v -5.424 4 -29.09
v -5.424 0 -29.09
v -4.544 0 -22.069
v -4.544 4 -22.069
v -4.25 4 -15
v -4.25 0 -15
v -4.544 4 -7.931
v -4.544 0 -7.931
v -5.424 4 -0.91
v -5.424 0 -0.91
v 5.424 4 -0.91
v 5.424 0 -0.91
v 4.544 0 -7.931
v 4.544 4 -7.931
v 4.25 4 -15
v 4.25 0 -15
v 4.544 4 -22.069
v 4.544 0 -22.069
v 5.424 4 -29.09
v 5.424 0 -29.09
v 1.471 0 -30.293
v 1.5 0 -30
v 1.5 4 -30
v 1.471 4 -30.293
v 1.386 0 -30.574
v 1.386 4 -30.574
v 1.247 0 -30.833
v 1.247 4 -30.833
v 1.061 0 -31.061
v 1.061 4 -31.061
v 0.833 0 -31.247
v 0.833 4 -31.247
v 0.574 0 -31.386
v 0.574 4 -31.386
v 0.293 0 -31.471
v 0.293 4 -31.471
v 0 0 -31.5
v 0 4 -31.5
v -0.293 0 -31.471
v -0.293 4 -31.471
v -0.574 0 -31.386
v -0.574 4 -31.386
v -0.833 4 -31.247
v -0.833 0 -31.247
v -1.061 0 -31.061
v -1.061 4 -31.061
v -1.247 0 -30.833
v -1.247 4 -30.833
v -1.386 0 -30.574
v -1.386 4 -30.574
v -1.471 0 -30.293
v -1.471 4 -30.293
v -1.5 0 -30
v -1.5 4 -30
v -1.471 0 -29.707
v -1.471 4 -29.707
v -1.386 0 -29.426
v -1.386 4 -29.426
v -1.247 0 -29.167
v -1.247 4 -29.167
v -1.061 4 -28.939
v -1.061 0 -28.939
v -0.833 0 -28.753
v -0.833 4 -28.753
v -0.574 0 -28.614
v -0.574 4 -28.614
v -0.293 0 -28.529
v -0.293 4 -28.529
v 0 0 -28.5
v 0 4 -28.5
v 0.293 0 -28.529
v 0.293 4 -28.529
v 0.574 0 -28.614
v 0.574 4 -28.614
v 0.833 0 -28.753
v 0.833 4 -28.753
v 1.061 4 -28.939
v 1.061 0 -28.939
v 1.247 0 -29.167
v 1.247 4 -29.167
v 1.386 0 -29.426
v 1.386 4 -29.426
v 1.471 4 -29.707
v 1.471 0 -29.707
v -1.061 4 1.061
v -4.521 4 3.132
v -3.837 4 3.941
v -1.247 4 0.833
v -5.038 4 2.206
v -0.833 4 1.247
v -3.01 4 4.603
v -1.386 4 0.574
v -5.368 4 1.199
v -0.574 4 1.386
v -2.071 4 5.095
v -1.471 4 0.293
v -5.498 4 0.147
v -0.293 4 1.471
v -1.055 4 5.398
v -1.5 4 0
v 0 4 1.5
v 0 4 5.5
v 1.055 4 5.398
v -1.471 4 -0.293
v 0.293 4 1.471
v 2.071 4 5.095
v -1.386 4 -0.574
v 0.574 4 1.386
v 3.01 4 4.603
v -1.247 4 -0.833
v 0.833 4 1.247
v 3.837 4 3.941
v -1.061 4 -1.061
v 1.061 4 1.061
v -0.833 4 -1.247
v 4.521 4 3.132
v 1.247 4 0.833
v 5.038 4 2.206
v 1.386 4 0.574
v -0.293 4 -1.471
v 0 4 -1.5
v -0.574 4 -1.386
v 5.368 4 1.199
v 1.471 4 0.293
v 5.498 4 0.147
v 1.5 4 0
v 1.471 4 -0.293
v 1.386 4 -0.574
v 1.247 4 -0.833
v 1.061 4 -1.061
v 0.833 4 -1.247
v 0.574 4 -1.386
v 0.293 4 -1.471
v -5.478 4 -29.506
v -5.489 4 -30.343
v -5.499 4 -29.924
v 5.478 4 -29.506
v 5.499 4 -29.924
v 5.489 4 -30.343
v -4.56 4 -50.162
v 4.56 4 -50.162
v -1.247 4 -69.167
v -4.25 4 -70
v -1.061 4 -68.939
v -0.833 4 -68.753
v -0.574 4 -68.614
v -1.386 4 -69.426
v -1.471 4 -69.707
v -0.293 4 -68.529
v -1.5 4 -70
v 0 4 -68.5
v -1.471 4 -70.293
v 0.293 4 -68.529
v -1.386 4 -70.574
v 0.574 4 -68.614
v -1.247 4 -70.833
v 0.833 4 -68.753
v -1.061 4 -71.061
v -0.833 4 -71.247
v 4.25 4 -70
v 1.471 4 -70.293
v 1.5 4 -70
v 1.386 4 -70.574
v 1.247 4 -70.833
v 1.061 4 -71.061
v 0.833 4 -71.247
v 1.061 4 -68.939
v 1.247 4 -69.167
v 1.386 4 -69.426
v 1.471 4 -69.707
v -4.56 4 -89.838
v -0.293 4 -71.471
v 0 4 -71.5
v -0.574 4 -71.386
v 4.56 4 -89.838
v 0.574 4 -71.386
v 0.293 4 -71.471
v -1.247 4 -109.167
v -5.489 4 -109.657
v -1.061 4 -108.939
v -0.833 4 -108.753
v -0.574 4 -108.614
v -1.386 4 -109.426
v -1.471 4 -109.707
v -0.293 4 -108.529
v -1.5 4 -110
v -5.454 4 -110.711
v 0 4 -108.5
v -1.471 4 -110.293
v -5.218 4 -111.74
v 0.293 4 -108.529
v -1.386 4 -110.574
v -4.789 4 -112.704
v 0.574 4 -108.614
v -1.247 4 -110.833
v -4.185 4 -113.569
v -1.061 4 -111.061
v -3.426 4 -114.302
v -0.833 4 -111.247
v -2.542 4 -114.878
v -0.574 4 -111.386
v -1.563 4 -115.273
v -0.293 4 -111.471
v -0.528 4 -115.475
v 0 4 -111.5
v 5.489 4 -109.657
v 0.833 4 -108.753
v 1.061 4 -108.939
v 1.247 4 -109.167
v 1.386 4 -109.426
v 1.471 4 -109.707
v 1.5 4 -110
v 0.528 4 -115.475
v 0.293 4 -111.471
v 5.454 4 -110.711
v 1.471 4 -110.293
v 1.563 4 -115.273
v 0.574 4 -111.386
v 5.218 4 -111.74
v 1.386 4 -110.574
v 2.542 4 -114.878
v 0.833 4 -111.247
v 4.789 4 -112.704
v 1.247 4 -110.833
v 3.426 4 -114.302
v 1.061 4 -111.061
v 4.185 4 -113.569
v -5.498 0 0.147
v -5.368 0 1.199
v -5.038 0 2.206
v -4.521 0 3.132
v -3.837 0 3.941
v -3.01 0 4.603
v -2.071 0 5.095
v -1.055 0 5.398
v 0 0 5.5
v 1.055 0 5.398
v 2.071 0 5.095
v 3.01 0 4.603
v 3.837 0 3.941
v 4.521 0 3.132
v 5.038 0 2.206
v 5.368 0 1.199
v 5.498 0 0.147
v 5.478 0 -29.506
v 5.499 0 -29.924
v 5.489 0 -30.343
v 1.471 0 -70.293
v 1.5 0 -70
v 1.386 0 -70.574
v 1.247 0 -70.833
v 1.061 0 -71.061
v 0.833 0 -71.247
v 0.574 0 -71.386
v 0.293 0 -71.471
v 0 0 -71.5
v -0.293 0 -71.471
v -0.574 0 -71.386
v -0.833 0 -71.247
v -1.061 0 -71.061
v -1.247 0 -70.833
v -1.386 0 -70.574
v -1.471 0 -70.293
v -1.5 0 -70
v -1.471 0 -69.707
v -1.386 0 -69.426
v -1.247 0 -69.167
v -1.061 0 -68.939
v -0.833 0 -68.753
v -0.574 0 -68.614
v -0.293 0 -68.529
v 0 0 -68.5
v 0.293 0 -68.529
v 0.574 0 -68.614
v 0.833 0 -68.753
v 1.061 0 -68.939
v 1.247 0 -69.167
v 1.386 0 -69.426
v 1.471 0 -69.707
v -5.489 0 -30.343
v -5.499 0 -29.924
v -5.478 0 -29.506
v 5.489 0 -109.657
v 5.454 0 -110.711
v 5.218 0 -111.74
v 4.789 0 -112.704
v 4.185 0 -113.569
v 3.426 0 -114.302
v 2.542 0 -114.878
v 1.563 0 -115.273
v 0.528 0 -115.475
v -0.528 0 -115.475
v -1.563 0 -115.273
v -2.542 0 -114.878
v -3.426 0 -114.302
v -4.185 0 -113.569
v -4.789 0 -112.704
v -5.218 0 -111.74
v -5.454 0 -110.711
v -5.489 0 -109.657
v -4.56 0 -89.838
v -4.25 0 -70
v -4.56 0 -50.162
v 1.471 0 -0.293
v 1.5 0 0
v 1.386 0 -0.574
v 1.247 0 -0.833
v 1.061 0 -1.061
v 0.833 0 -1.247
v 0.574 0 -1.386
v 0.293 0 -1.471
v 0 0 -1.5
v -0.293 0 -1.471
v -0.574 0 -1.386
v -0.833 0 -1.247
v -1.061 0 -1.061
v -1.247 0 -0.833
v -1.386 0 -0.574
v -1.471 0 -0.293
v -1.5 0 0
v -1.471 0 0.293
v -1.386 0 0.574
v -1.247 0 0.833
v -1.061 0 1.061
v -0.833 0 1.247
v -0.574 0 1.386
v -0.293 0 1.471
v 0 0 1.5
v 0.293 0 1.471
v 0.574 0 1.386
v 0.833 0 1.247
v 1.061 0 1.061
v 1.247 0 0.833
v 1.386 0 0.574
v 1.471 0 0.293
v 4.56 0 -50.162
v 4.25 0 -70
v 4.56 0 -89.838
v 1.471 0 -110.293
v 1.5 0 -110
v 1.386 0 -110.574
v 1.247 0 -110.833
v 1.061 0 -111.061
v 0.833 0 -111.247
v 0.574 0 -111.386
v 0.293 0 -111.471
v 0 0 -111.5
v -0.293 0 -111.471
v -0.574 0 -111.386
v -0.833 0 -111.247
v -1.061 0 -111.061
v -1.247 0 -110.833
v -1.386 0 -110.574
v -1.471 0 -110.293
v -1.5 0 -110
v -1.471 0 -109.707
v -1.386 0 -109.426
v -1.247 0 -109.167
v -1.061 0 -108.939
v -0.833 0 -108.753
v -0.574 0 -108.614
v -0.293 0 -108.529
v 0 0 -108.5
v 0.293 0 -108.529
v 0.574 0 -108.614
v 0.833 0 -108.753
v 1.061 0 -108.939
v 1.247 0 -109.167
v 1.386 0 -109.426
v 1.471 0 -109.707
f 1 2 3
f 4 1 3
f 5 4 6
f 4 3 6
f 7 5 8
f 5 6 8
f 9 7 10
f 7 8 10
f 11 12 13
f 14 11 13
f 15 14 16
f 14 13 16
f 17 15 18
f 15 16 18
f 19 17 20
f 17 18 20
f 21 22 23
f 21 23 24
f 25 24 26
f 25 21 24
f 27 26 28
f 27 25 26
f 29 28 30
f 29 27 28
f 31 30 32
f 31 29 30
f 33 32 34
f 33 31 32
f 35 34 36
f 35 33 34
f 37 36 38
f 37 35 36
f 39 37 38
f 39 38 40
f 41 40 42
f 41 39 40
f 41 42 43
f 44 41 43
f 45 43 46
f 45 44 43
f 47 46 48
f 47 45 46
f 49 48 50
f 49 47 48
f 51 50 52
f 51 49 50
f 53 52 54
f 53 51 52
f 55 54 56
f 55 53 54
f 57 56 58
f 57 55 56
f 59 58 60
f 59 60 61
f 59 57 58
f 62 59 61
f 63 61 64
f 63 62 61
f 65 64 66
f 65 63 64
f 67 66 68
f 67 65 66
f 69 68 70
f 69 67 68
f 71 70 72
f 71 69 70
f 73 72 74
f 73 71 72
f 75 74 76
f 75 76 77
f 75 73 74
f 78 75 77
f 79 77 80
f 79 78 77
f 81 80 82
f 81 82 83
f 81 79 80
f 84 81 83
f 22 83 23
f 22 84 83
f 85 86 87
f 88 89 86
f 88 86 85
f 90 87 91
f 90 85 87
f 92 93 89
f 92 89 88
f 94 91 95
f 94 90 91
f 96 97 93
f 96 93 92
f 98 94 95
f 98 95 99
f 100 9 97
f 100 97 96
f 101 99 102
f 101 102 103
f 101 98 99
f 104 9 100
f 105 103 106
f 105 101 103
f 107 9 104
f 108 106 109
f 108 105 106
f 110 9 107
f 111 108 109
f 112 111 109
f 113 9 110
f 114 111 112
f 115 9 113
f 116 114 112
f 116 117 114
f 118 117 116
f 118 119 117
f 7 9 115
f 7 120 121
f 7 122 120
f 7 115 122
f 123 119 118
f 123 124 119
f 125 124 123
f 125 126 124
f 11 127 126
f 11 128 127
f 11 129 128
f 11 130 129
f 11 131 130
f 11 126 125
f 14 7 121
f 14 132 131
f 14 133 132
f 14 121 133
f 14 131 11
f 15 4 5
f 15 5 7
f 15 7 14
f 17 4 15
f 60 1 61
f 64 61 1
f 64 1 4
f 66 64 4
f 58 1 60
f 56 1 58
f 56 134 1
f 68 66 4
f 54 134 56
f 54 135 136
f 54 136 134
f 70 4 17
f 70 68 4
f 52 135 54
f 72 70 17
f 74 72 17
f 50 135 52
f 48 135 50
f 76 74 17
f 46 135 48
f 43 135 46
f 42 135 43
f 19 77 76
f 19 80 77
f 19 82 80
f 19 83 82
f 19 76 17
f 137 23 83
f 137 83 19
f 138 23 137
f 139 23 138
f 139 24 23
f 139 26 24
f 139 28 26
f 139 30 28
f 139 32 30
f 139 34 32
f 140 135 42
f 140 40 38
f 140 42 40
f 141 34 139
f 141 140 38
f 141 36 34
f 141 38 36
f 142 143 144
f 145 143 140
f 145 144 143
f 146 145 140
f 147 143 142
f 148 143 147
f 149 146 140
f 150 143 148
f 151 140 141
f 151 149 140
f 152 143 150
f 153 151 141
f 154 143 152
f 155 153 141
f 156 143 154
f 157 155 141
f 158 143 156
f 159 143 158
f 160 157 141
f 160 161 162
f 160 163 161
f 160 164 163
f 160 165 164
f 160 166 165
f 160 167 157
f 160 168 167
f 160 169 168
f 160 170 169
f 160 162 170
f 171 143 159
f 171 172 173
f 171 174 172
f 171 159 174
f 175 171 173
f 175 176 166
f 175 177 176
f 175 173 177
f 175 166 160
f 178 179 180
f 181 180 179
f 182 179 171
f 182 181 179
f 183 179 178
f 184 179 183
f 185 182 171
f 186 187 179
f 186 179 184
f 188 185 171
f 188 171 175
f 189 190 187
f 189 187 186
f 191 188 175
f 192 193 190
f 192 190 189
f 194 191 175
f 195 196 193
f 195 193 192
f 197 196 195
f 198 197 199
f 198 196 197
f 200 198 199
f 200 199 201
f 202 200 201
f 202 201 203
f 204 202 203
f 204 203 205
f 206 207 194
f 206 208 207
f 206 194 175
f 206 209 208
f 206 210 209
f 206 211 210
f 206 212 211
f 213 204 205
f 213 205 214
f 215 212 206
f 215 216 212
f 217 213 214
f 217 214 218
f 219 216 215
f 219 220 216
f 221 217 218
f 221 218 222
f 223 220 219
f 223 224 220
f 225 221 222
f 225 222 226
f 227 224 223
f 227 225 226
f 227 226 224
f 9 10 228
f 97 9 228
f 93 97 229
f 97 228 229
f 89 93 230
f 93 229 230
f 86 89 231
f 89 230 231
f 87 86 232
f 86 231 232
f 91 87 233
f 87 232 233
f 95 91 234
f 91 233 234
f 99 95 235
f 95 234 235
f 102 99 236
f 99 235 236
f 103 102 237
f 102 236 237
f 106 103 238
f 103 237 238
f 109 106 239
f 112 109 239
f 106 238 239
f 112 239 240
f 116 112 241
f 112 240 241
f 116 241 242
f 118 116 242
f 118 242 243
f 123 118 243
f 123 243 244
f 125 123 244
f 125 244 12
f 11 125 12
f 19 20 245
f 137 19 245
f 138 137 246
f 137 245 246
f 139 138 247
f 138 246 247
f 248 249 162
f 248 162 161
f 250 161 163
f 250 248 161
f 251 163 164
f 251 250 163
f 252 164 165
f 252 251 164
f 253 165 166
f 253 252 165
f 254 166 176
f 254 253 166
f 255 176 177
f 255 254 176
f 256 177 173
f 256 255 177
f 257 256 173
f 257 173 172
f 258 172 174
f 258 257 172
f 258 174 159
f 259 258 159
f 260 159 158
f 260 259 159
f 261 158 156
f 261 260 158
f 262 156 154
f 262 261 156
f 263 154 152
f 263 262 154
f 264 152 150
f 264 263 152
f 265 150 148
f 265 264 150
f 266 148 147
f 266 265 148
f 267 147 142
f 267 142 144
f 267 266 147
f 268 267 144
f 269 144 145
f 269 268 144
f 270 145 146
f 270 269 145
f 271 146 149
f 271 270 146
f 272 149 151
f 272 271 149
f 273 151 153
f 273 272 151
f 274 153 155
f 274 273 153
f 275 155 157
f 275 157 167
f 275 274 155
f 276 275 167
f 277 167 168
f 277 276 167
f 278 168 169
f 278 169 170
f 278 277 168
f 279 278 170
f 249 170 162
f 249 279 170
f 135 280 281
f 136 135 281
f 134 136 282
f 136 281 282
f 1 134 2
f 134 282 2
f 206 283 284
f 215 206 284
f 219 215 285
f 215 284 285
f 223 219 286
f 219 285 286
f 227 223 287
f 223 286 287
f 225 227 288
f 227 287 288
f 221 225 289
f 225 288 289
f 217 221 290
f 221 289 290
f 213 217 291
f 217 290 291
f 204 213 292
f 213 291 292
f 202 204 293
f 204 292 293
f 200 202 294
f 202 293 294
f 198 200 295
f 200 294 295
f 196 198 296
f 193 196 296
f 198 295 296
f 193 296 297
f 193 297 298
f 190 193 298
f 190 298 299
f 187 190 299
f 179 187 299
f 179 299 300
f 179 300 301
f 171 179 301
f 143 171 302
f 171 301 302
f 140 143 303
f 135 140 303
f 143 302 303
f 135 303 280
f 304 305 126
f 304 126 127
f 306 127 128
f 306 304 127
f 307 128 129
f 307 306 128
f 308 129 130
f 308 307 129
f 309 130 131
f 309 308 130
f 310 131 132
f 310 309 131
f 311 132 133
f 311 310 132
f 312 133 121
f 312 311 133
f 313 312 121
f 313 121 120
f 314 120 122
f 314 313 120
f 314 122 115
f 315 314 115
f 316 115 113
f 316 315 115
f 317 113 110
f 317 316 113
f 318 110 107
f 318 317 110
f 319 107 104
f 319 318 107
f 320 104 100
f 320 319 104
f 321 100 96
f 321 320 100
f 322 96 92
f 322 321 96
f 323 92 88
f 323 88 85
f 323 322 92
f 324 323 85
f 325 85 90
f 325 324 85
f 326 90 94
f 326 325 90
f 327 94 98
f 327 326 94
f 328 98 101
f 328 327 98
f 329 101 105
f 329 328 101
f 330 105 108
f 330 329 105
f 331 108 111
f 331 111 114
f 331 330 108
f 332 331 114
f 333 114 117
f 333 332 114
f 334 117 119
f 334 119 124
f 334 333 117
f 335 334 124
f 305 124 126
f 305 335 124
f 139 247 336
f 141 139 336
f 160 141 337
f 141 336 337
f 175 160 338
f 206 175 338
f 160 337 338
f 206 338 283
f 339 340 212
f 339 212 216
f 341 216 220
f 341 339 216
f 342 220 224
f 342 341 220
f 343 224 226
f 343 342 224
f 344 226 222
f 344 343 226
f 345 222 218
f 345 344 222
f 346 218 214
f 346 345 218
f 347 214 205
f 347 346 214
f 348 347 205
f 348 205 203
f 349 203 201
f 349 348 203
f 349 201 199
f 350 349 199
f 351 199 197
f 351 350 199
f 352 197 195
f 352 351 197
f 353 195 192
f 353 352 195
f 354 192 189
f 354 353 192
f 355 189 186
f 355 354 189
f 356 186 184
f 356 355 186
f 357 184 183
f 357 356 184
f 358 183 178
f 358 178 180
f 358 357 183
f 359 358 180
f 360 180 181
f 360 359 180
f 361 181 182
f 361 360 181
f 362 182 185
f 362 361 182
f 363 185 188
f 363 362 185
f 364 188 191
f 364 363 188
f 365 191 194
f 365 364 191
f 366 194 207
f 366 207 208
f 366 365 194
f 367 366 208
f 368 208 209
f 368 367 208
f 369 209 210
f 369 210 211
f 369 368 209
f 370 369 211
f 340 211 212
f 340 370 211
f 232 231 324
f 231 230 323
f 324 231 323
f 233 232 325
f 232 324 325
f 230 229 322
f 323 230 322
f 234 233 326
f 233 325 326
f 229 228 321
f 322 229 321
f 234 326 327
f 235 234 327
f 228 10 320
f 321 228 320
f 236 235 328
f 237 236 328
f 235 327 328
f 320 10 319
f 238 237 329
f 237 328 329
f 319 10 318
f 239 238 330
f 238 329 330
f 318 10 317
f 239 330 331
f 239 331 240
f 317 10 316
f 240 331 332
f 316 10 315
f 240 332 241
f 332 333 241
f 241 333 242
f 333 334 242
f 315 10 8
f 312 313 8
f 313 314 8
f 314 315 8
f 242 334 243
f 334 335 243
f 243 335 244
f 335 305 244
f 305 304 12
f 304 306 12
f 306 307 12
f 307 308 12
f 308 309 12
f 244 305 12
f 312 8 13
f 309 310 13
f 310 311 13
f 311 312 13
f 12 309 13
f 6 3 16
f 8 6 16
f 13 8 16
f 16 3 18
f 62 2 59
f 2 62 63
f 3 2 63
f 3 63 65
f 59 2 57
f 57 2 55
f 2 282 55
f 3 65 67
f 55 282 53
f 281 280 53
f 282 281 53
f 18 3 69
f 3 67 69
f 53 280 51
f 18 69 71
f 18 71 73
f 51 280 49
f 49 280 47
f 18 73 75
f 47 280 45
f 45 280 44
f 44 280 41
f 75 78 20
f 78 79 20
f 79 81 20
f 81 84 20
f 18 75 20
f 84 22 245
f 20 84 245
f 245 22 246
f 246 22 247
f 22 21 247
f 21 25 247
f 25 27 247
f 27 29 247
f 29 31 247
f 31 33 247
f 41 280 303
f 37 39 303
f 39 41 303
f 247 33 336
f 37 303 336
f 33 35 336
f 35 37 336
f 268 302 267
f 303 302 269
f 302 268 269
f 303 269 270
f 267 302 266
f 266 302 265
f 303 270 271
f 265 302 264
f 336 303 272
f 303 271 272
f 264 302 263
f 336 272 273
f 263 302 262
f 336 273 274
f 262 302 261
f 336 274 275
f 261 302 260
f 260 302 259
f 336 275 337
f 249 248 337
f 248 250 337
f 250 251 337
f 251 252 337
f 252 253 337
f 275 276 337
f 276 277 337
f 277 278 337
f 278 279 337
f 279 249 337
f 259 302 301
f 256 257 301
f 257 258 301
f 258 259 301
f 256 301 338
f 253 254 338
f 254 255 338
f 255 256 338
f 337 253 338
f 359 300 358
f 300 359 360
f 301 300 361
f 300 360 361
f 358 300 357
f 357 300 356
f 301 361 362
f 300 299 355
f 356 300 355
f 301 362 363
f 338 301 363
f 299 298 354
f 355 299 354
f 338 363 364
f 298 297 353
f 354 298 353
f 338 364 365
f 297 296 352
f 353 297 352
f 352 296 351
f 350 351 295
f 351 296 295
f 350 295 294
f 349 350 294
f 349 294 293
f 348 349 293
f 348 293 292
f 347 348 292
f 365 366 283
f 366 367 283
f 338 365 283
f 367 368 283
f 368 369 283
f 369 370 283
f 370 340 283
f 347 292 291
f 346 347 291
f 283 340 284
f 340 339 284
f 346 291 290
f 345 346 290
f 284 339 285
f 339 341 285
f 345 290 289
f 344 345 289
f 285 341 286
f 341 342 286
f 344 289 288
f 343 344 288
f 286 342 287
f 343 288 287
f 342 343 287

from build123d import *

# Parameters (mm, degrees)
SKETCH1_R           = 1.5
BOSS_EXTRUDE1_DEPTH = 4


with BuildPart() as part:
    # Sketch1 → Boss-Extrude1 (new body)
    with BuildSketch(Plane(origin=(0, 0, 0), x_dir=(1, 0, 0), z_dir=(0, 1, 0))):
        with BuildLine():
            ThreePointArc((-5.424137931, 0.910344828), (0, -5.5), (5.424137931, 0.910344828))
            ThreePointArc((5.424137931, 0.910344828), (4.25, 15), (5.424137931, 29.089655172))
            ThreePointArc((5.424137931, 29.089655172), (5.492593836, 29.71467045), (5.489268293, 30.343414634))
            ThreePointArc((5.489268293, 30.343414634), (4.25, 70), (5.489268293, 109.656585366))
            ThreePointArc((5.489268293, 109.656585366), (0, 115.5), (-5.489268293, 109.656585366))
            ThreePointArc((-5.489268293, 109.656585366), (-4.25, 70), (-5.489268293, 30.343414634))
            ThreePointArc((-5.489268293, 30.343414634), (-5.492593836, 29.71467045), (-5.424137931, 29.089655172))
            ThreePointArc((-5.424137931, 29.089655172), (-4.25, 15), (-5.424137931, 0.910344828))
        make_face()
        Circle(SKETCH1_R, mode=Mode.SUBTRACT)
        with Locations((0, 110)):
            Circle(SKETCH1_R, mode=Mode.SUBTRACT)
        with Locations((0, 30)):
            Circle(SKETCH1_R, mode=Mode.SUBTRACT)
        with Locations((0, 70)):
            Circle(SKETCH1_R, mode=Mode.SUBTRACT)
    extrude(amount=BOSS_EXTRUDE1_DEPTH)


solid = part.part
